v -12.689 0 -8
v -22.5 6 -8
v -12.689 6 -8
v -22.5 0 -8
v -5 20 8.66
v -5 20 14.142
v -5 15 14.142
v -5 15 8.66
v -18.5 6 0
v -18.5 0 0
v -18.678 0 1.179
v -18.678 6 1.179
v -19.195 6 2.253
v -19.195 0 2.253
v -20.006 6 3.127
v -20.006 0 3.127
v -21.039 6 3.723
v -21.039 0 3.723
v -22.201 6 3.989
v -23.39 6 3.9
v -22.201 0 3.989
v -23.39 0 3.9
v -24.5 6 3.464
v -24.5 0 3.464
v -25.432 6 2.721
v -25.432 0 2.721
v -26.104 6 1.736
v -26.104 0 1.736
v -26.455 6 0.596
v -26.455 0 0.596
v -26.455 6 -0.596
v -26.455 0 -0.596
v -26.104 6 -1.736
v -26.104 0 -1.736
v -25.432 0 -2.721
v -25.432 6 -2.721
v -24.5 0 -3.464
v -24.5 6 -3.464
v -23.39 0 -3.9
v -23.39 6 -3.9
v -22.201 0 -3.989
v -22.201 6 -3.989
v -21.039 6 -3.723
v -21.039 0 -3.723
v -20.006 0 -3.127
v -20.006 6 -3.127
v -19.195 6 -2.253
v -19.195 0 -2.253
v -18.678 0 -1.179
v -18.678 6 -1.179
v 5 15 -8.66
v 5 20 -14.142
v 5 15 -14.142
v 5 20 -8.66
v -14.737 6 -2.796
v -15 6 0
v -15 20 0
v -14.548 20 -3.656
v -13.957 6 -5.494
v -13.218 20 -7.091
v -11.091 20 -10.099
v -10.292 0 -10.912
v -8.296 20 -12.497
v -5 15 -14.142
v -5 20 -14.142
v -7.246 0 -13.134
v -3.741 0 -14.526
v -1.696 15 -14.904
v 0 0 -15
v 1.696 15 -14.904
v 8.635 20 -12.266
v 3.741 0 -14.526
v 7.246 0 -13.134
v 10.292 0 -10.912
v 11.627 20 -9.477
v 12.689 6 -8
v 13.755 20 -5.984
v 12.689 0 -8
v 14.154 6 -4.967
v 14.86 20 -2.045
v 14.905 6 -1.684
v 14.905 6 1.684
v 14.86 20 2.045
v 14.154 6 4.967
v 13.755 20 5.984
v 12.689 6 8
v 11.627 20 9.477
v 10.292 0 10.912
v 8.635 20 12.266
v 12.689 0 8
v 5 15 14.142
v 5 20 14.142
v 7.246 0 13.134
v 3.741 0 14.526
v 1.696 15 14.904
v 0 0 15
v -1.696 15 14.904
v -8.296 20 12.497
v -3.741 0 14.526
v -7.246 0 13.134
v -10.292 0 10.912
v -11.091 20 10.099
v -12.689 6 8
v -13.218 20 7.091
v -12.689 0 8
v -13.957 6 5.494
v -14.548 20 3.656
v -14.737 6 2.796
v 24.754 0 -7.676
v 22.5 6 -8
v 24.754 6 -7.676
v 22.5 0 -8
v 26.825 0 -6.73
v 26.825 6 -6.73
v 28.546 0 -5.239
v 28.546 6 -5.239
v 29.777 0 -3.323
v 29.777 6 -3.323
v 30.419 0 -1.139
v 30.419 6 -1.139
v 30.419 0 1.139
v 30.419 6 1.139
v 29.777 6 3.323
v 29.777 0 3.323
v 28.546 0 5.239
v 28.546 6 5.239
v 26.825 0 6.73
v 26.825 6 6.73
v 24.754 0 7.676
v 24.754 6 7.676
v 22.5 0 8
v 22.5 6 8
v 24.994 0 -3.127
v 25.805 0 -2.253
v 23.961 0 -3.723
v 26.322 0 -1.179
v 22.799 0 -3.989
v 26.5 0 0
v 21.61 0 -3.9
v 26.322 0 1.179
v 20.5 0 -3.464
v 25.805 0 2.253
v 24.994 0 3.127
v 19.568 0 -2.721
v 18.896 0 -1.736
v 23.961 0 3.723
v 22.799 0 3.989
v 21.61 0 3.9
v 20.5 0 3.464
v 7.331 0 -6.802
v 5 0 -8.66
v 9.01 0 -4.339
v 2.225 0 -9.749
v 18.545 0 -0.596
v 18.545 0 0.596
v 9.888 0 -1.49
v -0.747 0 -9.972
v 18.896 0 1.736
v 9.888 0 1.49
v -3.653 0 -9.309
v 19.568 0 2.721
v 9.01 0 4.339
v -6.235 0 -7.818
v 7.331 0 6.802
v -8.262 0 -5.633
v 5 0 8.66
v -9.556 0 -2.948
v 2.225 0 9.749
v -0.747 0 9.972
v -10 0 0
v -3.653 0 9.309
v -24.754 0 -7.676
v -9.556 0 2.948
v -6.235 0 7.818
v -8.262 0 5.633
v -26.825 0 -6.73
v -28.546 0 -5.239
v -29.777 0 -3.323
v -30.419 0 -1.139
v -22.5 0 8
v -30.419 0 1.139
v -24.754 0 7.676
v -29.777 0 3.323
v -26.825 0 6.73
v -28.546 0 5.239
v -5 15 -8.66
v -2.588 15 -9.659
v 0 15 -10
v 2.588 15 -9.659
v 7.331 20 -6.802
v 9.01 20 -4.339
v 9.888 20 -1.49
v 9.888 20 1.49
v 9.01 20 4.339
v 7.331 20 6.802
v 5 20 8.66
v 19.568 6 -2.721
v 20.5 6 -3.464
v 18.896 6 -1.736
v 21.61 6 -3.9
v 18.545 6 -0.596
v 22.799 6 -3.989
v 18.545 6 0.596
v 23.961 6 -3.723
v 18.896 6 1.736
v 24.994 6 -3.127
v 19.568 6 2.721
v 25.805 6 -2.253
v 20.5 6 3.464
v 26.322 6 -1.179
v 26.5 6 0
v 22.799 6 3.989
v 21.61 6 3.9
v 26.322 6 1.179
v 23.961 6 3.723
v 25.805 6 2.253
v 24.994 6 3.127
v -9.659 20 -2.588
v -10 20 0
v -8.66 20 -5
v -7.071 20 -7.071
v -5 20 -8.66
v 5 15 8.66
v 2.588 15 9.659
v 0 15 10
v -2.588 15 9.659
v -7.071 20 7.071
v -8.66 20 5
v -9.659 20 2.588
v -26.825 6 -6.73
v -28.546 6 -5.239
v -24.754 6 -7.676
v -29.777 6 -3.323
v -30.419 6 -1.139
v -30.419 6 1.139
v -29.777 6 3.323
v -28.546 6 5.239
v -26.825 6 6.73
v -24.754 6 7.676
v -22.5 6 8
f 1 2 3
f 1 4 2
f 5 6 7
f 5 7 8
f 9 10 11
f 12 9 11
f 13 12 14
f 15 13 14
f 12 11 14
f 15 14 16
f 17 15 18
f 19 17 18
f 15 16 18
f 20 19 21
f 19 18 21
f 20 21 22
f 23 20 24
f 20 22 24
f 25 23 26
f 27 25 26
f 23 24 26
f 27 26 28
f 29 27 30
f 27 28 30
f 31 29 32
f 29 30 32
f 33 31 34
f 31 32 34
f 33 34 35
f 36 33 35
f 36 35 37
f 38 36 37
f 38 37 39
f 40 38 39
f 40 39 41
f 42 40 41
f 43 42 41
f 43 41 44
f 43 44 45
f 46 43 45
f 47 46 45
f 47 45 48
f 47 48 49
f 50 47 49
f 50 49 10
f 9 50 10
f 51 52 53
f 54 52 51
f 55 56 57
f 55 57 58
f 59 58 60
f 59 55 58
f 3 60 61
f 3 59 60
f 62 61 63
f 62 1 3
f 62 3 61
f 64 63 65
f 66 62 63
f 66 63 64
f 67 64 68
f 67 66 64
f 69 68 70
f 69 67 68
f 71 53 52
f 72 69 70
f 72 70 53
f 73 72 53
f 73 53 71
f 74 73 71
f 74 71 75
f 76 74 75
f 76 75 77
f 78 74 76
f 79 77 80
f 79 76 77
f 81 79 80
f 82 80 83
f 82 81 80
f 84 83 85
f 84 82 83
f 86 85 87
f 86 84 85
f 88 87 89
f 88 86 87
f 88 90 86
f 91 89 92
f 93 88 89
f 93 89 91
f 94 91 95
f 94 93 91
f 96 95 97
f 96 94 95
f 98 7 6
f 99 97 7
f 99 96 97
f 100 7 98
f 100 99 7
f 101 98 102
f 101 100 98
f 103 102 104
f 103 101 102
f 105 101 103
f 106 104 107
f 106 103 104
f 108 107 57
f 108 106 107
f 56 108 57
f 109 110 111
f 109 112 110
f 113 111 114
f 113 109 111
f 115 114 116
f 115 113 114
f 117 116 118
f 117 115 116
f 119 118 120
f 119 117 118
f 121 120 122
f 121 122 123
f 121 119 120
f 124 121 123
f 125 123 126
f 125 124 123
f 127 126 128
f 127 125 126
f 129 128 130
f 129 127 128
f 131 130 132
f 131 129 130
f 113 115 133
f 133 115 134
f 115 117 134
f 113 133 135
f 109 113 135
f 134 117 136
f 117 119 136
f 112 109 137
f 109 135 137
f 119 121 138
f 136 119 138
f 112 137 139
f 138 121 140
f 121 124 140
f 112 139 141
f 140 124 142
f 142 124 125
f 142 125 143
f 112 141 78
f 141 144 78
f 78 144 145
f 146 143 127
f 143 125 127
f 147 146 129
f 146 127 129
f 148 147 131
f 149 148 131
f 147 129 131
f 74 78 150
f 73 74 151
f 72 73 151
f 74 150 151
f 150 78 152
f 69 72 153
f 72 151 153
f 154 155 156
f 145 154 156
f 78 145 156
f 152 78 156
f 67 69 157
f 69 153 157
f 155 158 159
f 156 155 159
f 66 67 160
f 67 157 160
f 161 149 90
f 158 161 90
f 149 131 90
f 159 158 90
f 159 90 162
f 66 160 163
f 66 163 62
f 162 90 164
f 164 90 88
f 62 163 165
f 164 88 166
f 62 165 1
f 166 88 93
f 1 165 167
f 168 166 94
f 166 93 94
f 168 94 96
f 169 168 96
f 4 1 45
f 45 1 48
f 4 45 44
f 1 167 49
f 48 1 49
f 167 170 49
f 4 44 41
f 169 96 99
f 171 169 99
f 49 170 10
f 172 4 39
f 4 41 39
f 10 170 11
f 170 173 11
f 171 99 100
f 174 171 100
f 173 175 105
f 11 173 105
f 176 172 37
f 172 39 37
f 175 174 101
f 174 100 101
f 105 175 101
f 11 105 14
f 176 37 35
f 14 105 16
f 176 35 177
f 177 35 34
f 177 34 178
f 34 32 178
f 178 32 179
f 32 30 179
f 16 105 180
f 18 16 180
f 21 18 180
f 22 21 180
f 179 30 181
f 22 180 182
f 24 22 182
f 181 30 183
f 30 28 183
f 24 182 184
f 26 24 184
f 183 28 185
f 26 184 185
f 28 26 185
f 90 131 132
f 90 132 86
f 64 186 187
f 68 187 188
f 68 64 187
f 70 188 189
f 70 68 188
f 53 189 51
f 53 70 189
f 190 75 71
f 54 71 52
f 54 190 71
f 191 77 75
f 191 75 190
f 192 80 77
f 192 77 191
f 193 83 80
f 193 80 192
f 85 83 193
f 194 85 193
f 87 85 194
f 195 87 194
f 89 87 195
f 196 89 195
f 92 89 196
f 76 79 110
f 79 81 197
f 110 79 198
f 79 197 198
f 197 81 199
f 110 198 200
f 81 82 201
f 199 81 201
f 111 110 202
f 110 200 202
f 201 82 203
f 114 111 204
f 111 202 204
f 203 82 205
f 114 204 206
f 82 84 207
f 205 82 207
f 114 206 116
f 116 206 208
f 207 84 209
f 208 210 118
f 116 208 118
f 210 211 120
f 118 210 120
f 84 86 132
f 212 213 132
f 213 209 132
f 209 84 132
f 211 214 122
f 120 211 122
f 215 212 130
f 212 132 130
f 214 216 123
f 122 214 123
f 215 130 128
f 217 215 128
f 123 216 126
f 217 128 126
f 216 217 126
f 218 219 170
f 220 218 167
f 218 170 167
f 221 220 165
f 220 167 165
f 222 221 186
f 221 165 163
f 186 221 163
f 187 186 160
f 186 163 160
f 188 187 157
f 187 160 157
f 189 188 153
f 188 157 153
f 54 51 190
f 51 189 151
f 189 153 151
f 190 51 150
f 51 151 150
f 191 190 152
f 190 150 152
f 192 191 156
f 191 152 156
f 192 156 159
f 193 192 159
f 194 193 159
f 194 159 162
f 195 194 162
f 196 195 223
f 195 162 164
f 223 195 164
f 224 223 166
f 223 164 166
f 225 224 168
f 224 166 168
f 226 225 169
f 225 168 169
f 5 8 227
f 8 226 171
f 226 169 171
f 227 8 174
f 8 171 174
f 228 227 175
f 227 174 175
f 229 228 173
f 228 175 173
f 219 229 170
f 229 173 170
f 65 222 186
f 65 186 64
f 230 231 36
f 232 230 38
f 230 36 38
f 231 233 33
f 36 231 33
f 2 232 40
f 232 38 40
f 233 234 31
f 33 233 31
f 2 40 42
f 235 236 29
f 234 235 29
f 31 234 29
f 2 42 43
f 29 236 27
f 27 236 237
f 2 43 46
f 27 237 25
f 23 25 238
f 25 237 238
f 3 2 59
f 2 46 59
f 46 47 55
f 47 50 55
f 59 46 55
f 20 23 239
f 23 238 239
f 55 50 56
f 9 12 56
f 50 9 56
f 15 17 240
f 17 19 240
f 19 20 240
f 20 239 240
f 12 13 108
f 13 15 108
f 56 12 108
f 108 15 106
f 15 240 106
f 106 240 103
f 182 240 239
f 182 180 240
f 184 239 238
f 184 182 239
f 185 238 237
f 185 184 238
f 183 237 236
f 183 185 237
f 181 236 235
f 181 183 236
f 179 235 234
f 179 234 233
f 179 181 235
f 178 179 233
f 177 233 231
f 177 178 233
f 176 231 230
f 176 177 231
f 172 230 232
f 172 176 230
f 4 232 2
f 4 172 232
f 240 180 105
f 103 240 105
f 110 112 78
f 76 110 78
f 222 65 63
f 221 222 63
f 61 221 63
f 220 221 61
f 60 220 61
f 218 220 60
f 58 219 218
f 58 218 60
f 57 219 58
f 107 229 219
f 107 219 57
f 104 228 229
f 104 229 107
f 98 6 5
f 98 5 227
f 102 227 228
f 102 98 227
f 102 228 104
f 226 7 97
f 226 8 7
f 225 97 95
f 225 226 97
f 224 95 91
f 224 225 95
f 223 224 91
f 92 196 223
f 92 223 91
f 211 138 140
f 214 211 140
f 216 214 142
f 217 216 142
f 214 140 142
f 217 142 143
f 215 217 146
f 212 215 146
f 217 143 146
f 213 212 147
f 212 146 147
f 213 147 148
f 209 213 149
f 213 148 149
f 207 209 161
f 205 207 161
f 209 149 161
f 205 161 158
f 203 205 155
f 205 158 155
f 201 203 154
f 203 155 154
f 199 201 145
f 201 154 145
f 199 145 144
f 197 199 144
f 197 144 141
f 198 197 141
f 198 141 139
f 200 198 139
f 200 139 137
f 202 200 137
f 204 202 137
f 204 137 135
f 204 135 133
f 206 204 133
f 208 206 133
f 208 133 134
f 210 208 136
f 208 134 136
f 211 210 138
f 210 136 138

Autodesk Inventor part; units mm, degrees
ref_plane "YZ Plane" through (0, 0, 0) normal (1, 0, 0) x (0, 1, 0)
ref_plane "XZ Plane" through (0, 0, 0) normal (0, 1, 0) x (-1, 0, 0)
ref_plane "XY Plane" through (0, 0, 0) normal (0, 0, 1) x (1, 0, 0)
sketch "草图1" plane through (0, 0, 0) normal (0, 1, 0) x (-1, 0, 0)
  circle A0 centre (0, 0) radius 15
  circle A1 centre (0, 0) radius 10
  line L0 (0, 20.4744) -> (0, -21.3556)
  dimension "d0" = 30
  dimension "d1" = 20
extrude "拉伸1" add sketch "草图1" along normal blind 20 contours A0 L0 A1 | L0 A1 A0
sketch "草图2" plane through (0, 20, 0) normal (0, 1, 0) x (1, 0, 0)
  circle A0 centre (0, 0) radius 15 projected
  line L0 (-5, 17.5) -> (5, 17.5)
  line L1 (5, 17.5) -> (5, -17.5)
  line L2 (5, -17.5) -> (-5, -17.5)
  line L3 (-5, -17.5) -> (-5, 17.5)
  line L4 (-5, 17.5) -> (5, -17.5) construction
  line L5 (5, 17.5) -> (-5, -17.5) construction
  dimension "d5" = 10
  dimension "d6" = 35
extrude "拉伸2" cut sketch "草图2" against normal blind 5 contours L1 A0 L3 | A0 L3 L0 L1 | L1 L2 L3 A0
sketch "草图3" plane through (0, 0, 0) normal (0, -1, 0) x (1, 0, 0)
  circle A0 centre (0, 0) radius 10 projected
  circle A1 centre (0, 0) radius 15 projected
  arc A2 (-22.5, 8) -> (-22.5, -8) centre (-22.5, 0) ccw
  line L0 (-22.5, 8) -> (-12.6886, 8)
  line L1 (-22.5, -8) -> (-12.6886, -8)
  circle A3 centre (22.5, 0) radius 4
  circle A4 centre (-22.5, 0) radius 4
  line L2 (0, 19.1751) -> (0, -20.0629)
  arc A5 (22.5, -8) -> (22.5, 8) centre (22.5, 0) ccw
  line L3 (22.5, 8) -> (12.6886, 8)
  line L4 (22.5, -8) -> (12.6886, -8)
  dimension "d10" = 16
  dimension "d11" = 8
  dimension "d12" = 16
  dimension "d13" = 45
  dimension "d14" = 22.5
extrude "拉伸3" add sketch "草图3" against normal blind 6 contours L3 A5 L4 A1 | A1 L1 A2 L0
